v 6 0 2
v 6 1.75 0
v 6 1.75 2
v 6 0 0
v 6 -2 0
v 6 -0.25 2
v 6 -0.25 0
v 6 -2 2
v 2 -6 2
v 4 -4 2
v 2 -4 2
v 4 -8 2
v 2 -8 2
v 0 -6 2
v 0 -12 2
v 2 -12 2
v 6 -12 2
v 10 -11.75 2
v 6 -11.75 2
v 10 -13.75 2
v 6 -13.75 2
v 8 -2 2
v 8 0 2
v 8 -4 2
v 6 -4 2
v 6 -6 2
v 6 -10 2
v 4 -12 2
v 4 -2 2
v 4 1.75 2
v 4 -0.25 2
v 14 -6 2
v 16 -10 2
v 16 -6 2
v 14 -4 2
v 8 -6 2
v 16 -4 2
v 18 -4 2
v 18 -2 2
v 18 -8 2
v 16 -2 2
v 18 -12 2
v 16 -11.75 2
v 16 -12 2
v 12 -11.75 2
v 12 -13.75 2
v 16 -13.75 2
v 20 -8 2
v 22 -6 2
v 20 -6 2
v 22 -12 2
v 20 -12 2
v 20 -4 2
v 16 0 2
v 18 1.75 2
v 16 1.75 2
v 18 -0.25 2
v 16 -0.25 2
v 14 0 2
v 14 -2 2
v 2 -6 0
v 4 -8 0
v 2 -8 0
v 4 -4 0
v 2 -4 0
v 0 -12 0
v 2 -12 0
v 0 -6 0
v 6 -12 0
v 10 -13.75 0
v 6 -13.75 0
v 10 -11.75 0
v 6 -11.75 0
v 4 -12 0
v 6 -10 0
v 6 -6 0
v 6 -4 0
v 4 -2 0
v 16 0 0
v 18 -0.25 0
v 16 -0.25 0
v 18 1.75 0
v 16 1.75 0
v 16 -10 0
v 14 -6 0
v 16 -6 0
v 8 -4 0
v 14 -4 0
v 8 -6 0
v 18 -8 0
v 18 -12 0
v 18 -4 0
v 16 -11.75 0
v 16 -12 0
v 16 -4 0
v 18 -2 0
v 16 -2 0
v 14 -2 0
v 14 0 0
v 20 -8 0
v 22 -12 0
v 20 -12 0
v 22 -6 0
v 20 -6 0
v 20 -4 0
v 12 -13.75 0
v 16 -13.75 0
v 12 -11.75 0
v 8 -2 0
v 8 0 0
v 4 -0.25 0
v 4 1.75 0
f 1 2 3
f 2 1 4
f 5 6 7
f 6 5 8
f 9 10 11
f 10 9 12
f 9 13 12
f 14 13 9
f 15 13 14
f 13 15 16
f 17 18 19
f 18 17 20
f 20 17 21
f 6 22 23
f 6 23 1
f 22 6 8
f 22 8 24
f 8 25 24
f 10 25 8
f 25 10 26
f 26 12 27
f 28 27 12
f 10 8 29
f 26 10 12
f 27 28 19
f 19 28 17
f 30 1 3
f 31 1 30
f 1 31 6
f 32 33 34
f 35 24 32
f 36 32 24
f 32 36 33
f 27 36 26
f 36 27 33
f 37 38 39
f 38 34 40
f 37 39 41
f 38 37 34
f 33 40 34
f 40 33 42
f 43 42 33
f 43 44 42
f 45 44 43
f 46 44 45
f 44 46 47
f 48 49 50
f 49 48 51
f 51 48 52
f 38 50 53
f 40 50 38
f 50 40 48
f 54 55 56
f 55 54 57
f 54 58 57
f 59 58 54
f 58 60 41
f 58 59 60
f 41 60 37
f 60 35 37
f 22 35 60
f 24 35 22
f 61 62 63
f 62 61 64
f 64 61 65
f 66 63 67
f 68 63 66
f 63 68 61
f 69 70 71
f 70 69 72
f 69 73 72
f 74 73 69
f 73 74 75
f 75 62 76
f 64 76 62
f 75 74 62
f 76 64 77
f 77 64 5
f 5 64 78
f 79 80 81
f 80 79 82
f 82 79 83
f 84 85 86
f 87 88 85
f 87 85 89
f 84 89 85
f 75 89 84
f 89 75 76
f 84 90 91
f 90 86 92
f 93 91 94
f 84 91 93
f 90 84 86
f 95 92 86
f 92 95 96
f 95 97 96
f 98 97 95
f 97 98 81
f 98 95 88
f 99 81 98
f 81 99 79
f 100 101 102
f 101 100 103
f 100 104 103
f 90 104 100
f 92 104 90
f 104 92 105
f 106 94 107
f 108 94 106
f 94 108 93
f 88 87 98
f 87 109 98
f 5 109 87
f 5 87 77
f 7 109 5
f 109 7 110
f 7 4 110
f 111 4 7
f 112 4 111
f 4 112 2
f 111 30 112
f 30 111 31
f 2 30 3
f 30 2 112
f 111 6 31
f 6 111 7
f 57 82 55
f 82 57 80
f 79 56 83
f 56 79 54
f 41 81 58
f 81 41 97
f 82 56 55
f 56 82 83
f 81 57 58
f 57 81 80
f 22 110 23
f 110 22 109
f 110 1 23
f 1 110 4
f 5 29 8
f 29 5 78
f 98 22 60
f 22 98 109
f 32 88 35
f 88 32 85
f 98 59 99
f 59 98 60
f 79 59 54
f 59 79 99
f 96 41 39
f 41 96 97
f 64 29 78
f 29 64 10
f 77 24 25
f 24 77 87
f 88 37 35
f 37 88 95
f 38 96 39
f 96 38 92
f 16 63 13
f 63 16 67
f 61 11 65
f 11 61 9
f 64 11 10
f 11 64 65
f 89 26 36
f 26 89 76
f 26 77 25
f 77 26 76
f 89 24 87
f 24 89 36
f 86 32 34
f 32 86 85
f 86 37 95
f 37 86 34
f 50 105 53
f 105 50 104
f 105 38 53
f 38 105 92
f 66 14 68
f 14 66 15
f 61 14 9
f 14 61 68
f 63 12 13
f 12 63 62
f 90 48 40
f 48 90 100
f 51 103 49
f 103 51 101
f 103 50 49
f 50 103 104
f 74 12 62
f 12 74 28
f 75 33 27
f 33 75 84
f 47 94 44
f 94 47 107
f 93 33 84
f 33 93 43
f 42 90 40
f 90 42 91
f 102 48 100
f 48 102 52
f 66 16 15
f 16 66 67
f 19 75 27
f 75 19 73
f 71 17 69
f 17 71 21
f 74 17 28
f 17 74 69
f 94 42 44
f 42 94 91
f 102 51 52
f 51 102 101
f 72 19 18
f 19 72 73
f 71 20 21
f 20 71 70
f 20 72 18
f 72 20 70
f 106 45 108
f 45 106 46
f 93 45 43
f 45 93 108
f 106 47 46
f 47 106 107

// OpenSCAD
union() {
	translate(v = [0, -0.25, 0]) {
		translate(v = [0, 0, 0]) {
			translate(v = [4, 0, 0]) {
				color(alpha = 1.0, c = "white") {
					cube(size = 2);
				}
			}
		}
	}
	translate(v = [0, -0.25, 0]) {
		translate(v = [0, 0, 0]) {
			translate(v = [16, 0, 0]) {
				color(alpha = 1.0, c = "white") {
					cube(size = 2);
				}
			}
		}
	}
	translate(v = [0, -2, 0]) {
		translate(v = [6, 0, 0]) {
			color(alpha = 1.0, c = "white") {
				cube(size = 2);
			}
		}
	}
	translate(v = [0, -2, 0]) {
		translate(v = [14, 0, 0]) {
			color(alpha = 1.0, c = "white") {
				cube(size = 2);
			}
		}
	}
	translate(v = [0, -4, 0]) {
		translate(v = [4, 0, 0]) {
			color(alpha = 1.0, c = "white") {
				cube(size = 2);
			}
		}
	}
	translate(v = [0, -4, 0]) {
		translate(v = [6, 0, 0]) {
			color(alpha = 1.0, c = "white") {
				cube(size = 2);
			}
		}
	}
	translate(v = [0, -4, 0]) {
		translate(v = [8, 0, 0]) {
			color(alpha = 1.0, c = "white") {
				cube(size = 2);
			}
		}
	}
	translate(v = [0, -4, 0]) {
		translate(v = [10, 0, 0]) {
			color(alpha = 1.0, c = "white") {
				cube(size = 2);
			}
		}
	}
	translate(v = [0, -4, 0]) {
		translate(v = [12, 0, 0]) {
			color(alpha = 1.0, c = "white") {
				cube(size = 2);
			}
		}
	}
	translate(v = [0, -4, 0]) {
		translate(v = [14, 0, 0]) {
			color(alpha = 1.0, c = "white") {
				cube(size = 2);
			}
		}
	}
	translate(v = [0, -4, 0]) {
		translate(v = [16, 0, 0]) {
			color(alpha = 1.0, c = "white") {
				cube(size = 2);
			}
		}
	}
	translate(v = [0, -6, 0]) {
		translate(v = [2, 0, 0]) {
			color(alpha = 1.0, c = "white") {
				cube(size = 2);
			}
		}
	}
	translate(v = [0, -6, 0]) {
		translate(v = [4, 0, 0]) {
			color(alpha = 1.0, c = "white") {
				cube(size = 2);
			}
		}
	}
	translate(v = [0, -6, 0]) {
		translate(v = [8, 0, 0]) {
			color(alpha = 1.0, c = "white") {
				cube(size = 2);
			}
		}
	}
	translate(v = [0, -6, 0]) {
		translate(v = [10, 0, 0]) {
			color(alpha = 1.0, c = "white") {
				cube(size = 2);
			}
		}
	}
	translate(v = [0, -6, 0]) {
		translate(v = [12, 0, 0]) {
			color(alpha = 1.0, c = "white") {
				cube(size = 2);
			}
		}
	}
	translate(v = [0, -6, 0]) {
		translate(v = [16, 0, 0]) {
			color(alpha = 1.0, c = "white") {
				cube(size = 2);
			}
		}
	}
	translate(v = [0, -6, 0]) {
		translate(v = [18, 0, 0]) {
			color(alpha = 1.0, c = "white") {
				cube(size = 2);
			}
		}
	}
	translate(v = [0, -8, 0]) {
		translate(v = [0, 0, 0]) {
			color(alpha = 1.0, c = "white") {
				cube(size = 2);
			}
		}
	}
	translate(v = [0, -8, 0]) {
		translate(v = [2, 0, 0]) {
			color(alpha = 1.0, c = "white") {
				cube(size = 2);
			}
		}
	}
	translate(v = [0, -8, 0]) {
		translate(v = [4, 0, 0]) {
			color(alpha = 1.0, c = "white") {
				cube(size = 2);
			}
		}
	}
	translate(v = [0, -8, 0]) {
		translate(v = [6, 0, 0]) {
			color(alpha = 1.0, c = "white") {
				cube(size = 2);
			}
		}
	}
	translate(v = [0, -8, 0]) {
		translate(v = [8, 0, 0]) {
			color(alpha = 1.0, c = "white") {
				cube(size = 2);
			}
		}
	}
	translate(v = [0, -8, 0]) {
		translate(v = [10, 0, 0]) {
			color(alpha = 1.0, c = "white") {
				cube(size = 2);
			}
		}
	}
	translate(v = [0, -8, 0]) {
		translate(v = [12, 0, 0]) {
			color(alpha = 1.0, c = "white") {
				cube(size = 2);
			}
		}
	}
	translate(v = [0, -8, 0]) {
		translate(v = [14, 0, 0]) {
			color(alpha = 1.0, c = "white") {
				cube(size = 2);
			}
		}
	}
	translate(v = [0, -8, 0]) {
		translate(v = [16, 0, 0]) {
			color(alpha = 1.0, c = "white") {
				cube(size = 2);
			}
		}
	}
	translate(v = [0, -8, 0]) {
		translate(v = [18, 0, 0]) {
			color(alpha = 1.0, c = "white") {
				cube(size = 2);
			}
		}
	}
	translate(v = [0, -8, 0]) {
		translate(v = [20, 0, 0]) {
			color(alpha = 1.0, c = "white") {
				cube(size = 2);
			}
		}
	}
	translate(v = [0, -10, 0]) {
		translate(v = [0, 0, 0]) {
			color(alpha = 1.0, c = "white") {
				cube(size = 2);
			}
		}
	}
	translate(v = [0, -10, 0]) {
		translate(v = [4, 0, 0]) {
			color(alpha = 1.0, c = "white") {
				cube(size = 2);
			}
		}
	}
	translate(v = [0, -10, 0]) {
		translate(v = [6, 0, 0]) {
			color(alpha = 1.0, c = "white") {
				cube(size = 2);
			}
		}
	}
	translate(v = [0, -10, 0]) {
		translate(v = [8, 0, 0]) {
			color(alpha = 1.0, c = "white") {
				cube(size = 2);
			}
		}
	}
	translate(v = [0, -10, 0]) {
		translate(v = [10, 0, 0]) {
			color(alpha = 1.0, c = "white") {
				cube(size = 2);
			}
		}
	}
	translate(v = [0, -10, 0]) {
		translate(v = [12, 0, 0]) {
			color(alpha = 1.0, c = "white") {
				cube(size = 2);
			}
		}
	}
	translate(v = [0, -10, 0]) {
		translate(v = [14, 0, 0]) {
			color(alpha = 1.0, c = "white") {
				cube(size = 2);
			}
		}
	}
	translate(v = [0, -10, 0]) {
		translate(v = [16, 0, 0]) {
			color(alpha = 1.0, c = "white") {
				cube(size = 2);
			}
		}
	}
	translate(v = [0, -10, 0]) {
		translate(v = [20, 0, 0]) {
			color(alpha = 1.0, c = "white") {
				cube(size = 2);
			}
		}
	}
	translate(v = [0, -12, 0]) {
		translate(v = [0, 0, 0]) {
			color(alpha = 1.0, c = "white") {
				cube(size = 2);
			}
		}
	}
	translate(v = [0, -12, 0]) {
		translate(v = [4, 0, 0]) {
			color(alpha = 1.0, c = "white") {
				cube(size = 2);
			}
		}
	}
	translate(v = [0, -12, 0]) {
		translate(v = [16, 0, 0]) {
			color(alpha = 1.0, c = "white") {
				cube(size = 2);
			}
		}
	}
	translate(v = [0, -12, 0]) {
		translate(v = [20, 0, 0]) {
			color(alpha = 1.0, c = "white") {
				cube(size = 2);
			}
		}
	}
	translate(v = [0, 0.25, 0]) {
		translate(v = [0, -14, 0]) {
			translate(v = [6, 0, 0]) {
				color(alpha = 1.0, c = "white") {
					cube(size = 2);
				}
			}
		}
	}
	translate(v = [0, 0.25, 0]) {
		translate(v = [0, -14, 0]) {
			translate(v = [8, 0, 0]) {
				color(alpha = 1.0, c = "white") {
					cube(size = 2);
				}
			}
		}
	}
	translate(v = [0, 0.25, 0]) {
		translate(v = [0, -14, 0]) {
			translate(v = [12, 0, 0]) {
				color(alpha = 1.0, c = "white") {
					cube(size = 2);
				}
			}
		}
	}
	translate(v = [0, 0.25, 0]) {
		translate(v = [0, -14, 0]) {
			translate(v = [14, 0, 0]) {
				color(alpha = 1.0, c = "white") {
					cube(size = 2);
				}
			}
		}
	}
}
